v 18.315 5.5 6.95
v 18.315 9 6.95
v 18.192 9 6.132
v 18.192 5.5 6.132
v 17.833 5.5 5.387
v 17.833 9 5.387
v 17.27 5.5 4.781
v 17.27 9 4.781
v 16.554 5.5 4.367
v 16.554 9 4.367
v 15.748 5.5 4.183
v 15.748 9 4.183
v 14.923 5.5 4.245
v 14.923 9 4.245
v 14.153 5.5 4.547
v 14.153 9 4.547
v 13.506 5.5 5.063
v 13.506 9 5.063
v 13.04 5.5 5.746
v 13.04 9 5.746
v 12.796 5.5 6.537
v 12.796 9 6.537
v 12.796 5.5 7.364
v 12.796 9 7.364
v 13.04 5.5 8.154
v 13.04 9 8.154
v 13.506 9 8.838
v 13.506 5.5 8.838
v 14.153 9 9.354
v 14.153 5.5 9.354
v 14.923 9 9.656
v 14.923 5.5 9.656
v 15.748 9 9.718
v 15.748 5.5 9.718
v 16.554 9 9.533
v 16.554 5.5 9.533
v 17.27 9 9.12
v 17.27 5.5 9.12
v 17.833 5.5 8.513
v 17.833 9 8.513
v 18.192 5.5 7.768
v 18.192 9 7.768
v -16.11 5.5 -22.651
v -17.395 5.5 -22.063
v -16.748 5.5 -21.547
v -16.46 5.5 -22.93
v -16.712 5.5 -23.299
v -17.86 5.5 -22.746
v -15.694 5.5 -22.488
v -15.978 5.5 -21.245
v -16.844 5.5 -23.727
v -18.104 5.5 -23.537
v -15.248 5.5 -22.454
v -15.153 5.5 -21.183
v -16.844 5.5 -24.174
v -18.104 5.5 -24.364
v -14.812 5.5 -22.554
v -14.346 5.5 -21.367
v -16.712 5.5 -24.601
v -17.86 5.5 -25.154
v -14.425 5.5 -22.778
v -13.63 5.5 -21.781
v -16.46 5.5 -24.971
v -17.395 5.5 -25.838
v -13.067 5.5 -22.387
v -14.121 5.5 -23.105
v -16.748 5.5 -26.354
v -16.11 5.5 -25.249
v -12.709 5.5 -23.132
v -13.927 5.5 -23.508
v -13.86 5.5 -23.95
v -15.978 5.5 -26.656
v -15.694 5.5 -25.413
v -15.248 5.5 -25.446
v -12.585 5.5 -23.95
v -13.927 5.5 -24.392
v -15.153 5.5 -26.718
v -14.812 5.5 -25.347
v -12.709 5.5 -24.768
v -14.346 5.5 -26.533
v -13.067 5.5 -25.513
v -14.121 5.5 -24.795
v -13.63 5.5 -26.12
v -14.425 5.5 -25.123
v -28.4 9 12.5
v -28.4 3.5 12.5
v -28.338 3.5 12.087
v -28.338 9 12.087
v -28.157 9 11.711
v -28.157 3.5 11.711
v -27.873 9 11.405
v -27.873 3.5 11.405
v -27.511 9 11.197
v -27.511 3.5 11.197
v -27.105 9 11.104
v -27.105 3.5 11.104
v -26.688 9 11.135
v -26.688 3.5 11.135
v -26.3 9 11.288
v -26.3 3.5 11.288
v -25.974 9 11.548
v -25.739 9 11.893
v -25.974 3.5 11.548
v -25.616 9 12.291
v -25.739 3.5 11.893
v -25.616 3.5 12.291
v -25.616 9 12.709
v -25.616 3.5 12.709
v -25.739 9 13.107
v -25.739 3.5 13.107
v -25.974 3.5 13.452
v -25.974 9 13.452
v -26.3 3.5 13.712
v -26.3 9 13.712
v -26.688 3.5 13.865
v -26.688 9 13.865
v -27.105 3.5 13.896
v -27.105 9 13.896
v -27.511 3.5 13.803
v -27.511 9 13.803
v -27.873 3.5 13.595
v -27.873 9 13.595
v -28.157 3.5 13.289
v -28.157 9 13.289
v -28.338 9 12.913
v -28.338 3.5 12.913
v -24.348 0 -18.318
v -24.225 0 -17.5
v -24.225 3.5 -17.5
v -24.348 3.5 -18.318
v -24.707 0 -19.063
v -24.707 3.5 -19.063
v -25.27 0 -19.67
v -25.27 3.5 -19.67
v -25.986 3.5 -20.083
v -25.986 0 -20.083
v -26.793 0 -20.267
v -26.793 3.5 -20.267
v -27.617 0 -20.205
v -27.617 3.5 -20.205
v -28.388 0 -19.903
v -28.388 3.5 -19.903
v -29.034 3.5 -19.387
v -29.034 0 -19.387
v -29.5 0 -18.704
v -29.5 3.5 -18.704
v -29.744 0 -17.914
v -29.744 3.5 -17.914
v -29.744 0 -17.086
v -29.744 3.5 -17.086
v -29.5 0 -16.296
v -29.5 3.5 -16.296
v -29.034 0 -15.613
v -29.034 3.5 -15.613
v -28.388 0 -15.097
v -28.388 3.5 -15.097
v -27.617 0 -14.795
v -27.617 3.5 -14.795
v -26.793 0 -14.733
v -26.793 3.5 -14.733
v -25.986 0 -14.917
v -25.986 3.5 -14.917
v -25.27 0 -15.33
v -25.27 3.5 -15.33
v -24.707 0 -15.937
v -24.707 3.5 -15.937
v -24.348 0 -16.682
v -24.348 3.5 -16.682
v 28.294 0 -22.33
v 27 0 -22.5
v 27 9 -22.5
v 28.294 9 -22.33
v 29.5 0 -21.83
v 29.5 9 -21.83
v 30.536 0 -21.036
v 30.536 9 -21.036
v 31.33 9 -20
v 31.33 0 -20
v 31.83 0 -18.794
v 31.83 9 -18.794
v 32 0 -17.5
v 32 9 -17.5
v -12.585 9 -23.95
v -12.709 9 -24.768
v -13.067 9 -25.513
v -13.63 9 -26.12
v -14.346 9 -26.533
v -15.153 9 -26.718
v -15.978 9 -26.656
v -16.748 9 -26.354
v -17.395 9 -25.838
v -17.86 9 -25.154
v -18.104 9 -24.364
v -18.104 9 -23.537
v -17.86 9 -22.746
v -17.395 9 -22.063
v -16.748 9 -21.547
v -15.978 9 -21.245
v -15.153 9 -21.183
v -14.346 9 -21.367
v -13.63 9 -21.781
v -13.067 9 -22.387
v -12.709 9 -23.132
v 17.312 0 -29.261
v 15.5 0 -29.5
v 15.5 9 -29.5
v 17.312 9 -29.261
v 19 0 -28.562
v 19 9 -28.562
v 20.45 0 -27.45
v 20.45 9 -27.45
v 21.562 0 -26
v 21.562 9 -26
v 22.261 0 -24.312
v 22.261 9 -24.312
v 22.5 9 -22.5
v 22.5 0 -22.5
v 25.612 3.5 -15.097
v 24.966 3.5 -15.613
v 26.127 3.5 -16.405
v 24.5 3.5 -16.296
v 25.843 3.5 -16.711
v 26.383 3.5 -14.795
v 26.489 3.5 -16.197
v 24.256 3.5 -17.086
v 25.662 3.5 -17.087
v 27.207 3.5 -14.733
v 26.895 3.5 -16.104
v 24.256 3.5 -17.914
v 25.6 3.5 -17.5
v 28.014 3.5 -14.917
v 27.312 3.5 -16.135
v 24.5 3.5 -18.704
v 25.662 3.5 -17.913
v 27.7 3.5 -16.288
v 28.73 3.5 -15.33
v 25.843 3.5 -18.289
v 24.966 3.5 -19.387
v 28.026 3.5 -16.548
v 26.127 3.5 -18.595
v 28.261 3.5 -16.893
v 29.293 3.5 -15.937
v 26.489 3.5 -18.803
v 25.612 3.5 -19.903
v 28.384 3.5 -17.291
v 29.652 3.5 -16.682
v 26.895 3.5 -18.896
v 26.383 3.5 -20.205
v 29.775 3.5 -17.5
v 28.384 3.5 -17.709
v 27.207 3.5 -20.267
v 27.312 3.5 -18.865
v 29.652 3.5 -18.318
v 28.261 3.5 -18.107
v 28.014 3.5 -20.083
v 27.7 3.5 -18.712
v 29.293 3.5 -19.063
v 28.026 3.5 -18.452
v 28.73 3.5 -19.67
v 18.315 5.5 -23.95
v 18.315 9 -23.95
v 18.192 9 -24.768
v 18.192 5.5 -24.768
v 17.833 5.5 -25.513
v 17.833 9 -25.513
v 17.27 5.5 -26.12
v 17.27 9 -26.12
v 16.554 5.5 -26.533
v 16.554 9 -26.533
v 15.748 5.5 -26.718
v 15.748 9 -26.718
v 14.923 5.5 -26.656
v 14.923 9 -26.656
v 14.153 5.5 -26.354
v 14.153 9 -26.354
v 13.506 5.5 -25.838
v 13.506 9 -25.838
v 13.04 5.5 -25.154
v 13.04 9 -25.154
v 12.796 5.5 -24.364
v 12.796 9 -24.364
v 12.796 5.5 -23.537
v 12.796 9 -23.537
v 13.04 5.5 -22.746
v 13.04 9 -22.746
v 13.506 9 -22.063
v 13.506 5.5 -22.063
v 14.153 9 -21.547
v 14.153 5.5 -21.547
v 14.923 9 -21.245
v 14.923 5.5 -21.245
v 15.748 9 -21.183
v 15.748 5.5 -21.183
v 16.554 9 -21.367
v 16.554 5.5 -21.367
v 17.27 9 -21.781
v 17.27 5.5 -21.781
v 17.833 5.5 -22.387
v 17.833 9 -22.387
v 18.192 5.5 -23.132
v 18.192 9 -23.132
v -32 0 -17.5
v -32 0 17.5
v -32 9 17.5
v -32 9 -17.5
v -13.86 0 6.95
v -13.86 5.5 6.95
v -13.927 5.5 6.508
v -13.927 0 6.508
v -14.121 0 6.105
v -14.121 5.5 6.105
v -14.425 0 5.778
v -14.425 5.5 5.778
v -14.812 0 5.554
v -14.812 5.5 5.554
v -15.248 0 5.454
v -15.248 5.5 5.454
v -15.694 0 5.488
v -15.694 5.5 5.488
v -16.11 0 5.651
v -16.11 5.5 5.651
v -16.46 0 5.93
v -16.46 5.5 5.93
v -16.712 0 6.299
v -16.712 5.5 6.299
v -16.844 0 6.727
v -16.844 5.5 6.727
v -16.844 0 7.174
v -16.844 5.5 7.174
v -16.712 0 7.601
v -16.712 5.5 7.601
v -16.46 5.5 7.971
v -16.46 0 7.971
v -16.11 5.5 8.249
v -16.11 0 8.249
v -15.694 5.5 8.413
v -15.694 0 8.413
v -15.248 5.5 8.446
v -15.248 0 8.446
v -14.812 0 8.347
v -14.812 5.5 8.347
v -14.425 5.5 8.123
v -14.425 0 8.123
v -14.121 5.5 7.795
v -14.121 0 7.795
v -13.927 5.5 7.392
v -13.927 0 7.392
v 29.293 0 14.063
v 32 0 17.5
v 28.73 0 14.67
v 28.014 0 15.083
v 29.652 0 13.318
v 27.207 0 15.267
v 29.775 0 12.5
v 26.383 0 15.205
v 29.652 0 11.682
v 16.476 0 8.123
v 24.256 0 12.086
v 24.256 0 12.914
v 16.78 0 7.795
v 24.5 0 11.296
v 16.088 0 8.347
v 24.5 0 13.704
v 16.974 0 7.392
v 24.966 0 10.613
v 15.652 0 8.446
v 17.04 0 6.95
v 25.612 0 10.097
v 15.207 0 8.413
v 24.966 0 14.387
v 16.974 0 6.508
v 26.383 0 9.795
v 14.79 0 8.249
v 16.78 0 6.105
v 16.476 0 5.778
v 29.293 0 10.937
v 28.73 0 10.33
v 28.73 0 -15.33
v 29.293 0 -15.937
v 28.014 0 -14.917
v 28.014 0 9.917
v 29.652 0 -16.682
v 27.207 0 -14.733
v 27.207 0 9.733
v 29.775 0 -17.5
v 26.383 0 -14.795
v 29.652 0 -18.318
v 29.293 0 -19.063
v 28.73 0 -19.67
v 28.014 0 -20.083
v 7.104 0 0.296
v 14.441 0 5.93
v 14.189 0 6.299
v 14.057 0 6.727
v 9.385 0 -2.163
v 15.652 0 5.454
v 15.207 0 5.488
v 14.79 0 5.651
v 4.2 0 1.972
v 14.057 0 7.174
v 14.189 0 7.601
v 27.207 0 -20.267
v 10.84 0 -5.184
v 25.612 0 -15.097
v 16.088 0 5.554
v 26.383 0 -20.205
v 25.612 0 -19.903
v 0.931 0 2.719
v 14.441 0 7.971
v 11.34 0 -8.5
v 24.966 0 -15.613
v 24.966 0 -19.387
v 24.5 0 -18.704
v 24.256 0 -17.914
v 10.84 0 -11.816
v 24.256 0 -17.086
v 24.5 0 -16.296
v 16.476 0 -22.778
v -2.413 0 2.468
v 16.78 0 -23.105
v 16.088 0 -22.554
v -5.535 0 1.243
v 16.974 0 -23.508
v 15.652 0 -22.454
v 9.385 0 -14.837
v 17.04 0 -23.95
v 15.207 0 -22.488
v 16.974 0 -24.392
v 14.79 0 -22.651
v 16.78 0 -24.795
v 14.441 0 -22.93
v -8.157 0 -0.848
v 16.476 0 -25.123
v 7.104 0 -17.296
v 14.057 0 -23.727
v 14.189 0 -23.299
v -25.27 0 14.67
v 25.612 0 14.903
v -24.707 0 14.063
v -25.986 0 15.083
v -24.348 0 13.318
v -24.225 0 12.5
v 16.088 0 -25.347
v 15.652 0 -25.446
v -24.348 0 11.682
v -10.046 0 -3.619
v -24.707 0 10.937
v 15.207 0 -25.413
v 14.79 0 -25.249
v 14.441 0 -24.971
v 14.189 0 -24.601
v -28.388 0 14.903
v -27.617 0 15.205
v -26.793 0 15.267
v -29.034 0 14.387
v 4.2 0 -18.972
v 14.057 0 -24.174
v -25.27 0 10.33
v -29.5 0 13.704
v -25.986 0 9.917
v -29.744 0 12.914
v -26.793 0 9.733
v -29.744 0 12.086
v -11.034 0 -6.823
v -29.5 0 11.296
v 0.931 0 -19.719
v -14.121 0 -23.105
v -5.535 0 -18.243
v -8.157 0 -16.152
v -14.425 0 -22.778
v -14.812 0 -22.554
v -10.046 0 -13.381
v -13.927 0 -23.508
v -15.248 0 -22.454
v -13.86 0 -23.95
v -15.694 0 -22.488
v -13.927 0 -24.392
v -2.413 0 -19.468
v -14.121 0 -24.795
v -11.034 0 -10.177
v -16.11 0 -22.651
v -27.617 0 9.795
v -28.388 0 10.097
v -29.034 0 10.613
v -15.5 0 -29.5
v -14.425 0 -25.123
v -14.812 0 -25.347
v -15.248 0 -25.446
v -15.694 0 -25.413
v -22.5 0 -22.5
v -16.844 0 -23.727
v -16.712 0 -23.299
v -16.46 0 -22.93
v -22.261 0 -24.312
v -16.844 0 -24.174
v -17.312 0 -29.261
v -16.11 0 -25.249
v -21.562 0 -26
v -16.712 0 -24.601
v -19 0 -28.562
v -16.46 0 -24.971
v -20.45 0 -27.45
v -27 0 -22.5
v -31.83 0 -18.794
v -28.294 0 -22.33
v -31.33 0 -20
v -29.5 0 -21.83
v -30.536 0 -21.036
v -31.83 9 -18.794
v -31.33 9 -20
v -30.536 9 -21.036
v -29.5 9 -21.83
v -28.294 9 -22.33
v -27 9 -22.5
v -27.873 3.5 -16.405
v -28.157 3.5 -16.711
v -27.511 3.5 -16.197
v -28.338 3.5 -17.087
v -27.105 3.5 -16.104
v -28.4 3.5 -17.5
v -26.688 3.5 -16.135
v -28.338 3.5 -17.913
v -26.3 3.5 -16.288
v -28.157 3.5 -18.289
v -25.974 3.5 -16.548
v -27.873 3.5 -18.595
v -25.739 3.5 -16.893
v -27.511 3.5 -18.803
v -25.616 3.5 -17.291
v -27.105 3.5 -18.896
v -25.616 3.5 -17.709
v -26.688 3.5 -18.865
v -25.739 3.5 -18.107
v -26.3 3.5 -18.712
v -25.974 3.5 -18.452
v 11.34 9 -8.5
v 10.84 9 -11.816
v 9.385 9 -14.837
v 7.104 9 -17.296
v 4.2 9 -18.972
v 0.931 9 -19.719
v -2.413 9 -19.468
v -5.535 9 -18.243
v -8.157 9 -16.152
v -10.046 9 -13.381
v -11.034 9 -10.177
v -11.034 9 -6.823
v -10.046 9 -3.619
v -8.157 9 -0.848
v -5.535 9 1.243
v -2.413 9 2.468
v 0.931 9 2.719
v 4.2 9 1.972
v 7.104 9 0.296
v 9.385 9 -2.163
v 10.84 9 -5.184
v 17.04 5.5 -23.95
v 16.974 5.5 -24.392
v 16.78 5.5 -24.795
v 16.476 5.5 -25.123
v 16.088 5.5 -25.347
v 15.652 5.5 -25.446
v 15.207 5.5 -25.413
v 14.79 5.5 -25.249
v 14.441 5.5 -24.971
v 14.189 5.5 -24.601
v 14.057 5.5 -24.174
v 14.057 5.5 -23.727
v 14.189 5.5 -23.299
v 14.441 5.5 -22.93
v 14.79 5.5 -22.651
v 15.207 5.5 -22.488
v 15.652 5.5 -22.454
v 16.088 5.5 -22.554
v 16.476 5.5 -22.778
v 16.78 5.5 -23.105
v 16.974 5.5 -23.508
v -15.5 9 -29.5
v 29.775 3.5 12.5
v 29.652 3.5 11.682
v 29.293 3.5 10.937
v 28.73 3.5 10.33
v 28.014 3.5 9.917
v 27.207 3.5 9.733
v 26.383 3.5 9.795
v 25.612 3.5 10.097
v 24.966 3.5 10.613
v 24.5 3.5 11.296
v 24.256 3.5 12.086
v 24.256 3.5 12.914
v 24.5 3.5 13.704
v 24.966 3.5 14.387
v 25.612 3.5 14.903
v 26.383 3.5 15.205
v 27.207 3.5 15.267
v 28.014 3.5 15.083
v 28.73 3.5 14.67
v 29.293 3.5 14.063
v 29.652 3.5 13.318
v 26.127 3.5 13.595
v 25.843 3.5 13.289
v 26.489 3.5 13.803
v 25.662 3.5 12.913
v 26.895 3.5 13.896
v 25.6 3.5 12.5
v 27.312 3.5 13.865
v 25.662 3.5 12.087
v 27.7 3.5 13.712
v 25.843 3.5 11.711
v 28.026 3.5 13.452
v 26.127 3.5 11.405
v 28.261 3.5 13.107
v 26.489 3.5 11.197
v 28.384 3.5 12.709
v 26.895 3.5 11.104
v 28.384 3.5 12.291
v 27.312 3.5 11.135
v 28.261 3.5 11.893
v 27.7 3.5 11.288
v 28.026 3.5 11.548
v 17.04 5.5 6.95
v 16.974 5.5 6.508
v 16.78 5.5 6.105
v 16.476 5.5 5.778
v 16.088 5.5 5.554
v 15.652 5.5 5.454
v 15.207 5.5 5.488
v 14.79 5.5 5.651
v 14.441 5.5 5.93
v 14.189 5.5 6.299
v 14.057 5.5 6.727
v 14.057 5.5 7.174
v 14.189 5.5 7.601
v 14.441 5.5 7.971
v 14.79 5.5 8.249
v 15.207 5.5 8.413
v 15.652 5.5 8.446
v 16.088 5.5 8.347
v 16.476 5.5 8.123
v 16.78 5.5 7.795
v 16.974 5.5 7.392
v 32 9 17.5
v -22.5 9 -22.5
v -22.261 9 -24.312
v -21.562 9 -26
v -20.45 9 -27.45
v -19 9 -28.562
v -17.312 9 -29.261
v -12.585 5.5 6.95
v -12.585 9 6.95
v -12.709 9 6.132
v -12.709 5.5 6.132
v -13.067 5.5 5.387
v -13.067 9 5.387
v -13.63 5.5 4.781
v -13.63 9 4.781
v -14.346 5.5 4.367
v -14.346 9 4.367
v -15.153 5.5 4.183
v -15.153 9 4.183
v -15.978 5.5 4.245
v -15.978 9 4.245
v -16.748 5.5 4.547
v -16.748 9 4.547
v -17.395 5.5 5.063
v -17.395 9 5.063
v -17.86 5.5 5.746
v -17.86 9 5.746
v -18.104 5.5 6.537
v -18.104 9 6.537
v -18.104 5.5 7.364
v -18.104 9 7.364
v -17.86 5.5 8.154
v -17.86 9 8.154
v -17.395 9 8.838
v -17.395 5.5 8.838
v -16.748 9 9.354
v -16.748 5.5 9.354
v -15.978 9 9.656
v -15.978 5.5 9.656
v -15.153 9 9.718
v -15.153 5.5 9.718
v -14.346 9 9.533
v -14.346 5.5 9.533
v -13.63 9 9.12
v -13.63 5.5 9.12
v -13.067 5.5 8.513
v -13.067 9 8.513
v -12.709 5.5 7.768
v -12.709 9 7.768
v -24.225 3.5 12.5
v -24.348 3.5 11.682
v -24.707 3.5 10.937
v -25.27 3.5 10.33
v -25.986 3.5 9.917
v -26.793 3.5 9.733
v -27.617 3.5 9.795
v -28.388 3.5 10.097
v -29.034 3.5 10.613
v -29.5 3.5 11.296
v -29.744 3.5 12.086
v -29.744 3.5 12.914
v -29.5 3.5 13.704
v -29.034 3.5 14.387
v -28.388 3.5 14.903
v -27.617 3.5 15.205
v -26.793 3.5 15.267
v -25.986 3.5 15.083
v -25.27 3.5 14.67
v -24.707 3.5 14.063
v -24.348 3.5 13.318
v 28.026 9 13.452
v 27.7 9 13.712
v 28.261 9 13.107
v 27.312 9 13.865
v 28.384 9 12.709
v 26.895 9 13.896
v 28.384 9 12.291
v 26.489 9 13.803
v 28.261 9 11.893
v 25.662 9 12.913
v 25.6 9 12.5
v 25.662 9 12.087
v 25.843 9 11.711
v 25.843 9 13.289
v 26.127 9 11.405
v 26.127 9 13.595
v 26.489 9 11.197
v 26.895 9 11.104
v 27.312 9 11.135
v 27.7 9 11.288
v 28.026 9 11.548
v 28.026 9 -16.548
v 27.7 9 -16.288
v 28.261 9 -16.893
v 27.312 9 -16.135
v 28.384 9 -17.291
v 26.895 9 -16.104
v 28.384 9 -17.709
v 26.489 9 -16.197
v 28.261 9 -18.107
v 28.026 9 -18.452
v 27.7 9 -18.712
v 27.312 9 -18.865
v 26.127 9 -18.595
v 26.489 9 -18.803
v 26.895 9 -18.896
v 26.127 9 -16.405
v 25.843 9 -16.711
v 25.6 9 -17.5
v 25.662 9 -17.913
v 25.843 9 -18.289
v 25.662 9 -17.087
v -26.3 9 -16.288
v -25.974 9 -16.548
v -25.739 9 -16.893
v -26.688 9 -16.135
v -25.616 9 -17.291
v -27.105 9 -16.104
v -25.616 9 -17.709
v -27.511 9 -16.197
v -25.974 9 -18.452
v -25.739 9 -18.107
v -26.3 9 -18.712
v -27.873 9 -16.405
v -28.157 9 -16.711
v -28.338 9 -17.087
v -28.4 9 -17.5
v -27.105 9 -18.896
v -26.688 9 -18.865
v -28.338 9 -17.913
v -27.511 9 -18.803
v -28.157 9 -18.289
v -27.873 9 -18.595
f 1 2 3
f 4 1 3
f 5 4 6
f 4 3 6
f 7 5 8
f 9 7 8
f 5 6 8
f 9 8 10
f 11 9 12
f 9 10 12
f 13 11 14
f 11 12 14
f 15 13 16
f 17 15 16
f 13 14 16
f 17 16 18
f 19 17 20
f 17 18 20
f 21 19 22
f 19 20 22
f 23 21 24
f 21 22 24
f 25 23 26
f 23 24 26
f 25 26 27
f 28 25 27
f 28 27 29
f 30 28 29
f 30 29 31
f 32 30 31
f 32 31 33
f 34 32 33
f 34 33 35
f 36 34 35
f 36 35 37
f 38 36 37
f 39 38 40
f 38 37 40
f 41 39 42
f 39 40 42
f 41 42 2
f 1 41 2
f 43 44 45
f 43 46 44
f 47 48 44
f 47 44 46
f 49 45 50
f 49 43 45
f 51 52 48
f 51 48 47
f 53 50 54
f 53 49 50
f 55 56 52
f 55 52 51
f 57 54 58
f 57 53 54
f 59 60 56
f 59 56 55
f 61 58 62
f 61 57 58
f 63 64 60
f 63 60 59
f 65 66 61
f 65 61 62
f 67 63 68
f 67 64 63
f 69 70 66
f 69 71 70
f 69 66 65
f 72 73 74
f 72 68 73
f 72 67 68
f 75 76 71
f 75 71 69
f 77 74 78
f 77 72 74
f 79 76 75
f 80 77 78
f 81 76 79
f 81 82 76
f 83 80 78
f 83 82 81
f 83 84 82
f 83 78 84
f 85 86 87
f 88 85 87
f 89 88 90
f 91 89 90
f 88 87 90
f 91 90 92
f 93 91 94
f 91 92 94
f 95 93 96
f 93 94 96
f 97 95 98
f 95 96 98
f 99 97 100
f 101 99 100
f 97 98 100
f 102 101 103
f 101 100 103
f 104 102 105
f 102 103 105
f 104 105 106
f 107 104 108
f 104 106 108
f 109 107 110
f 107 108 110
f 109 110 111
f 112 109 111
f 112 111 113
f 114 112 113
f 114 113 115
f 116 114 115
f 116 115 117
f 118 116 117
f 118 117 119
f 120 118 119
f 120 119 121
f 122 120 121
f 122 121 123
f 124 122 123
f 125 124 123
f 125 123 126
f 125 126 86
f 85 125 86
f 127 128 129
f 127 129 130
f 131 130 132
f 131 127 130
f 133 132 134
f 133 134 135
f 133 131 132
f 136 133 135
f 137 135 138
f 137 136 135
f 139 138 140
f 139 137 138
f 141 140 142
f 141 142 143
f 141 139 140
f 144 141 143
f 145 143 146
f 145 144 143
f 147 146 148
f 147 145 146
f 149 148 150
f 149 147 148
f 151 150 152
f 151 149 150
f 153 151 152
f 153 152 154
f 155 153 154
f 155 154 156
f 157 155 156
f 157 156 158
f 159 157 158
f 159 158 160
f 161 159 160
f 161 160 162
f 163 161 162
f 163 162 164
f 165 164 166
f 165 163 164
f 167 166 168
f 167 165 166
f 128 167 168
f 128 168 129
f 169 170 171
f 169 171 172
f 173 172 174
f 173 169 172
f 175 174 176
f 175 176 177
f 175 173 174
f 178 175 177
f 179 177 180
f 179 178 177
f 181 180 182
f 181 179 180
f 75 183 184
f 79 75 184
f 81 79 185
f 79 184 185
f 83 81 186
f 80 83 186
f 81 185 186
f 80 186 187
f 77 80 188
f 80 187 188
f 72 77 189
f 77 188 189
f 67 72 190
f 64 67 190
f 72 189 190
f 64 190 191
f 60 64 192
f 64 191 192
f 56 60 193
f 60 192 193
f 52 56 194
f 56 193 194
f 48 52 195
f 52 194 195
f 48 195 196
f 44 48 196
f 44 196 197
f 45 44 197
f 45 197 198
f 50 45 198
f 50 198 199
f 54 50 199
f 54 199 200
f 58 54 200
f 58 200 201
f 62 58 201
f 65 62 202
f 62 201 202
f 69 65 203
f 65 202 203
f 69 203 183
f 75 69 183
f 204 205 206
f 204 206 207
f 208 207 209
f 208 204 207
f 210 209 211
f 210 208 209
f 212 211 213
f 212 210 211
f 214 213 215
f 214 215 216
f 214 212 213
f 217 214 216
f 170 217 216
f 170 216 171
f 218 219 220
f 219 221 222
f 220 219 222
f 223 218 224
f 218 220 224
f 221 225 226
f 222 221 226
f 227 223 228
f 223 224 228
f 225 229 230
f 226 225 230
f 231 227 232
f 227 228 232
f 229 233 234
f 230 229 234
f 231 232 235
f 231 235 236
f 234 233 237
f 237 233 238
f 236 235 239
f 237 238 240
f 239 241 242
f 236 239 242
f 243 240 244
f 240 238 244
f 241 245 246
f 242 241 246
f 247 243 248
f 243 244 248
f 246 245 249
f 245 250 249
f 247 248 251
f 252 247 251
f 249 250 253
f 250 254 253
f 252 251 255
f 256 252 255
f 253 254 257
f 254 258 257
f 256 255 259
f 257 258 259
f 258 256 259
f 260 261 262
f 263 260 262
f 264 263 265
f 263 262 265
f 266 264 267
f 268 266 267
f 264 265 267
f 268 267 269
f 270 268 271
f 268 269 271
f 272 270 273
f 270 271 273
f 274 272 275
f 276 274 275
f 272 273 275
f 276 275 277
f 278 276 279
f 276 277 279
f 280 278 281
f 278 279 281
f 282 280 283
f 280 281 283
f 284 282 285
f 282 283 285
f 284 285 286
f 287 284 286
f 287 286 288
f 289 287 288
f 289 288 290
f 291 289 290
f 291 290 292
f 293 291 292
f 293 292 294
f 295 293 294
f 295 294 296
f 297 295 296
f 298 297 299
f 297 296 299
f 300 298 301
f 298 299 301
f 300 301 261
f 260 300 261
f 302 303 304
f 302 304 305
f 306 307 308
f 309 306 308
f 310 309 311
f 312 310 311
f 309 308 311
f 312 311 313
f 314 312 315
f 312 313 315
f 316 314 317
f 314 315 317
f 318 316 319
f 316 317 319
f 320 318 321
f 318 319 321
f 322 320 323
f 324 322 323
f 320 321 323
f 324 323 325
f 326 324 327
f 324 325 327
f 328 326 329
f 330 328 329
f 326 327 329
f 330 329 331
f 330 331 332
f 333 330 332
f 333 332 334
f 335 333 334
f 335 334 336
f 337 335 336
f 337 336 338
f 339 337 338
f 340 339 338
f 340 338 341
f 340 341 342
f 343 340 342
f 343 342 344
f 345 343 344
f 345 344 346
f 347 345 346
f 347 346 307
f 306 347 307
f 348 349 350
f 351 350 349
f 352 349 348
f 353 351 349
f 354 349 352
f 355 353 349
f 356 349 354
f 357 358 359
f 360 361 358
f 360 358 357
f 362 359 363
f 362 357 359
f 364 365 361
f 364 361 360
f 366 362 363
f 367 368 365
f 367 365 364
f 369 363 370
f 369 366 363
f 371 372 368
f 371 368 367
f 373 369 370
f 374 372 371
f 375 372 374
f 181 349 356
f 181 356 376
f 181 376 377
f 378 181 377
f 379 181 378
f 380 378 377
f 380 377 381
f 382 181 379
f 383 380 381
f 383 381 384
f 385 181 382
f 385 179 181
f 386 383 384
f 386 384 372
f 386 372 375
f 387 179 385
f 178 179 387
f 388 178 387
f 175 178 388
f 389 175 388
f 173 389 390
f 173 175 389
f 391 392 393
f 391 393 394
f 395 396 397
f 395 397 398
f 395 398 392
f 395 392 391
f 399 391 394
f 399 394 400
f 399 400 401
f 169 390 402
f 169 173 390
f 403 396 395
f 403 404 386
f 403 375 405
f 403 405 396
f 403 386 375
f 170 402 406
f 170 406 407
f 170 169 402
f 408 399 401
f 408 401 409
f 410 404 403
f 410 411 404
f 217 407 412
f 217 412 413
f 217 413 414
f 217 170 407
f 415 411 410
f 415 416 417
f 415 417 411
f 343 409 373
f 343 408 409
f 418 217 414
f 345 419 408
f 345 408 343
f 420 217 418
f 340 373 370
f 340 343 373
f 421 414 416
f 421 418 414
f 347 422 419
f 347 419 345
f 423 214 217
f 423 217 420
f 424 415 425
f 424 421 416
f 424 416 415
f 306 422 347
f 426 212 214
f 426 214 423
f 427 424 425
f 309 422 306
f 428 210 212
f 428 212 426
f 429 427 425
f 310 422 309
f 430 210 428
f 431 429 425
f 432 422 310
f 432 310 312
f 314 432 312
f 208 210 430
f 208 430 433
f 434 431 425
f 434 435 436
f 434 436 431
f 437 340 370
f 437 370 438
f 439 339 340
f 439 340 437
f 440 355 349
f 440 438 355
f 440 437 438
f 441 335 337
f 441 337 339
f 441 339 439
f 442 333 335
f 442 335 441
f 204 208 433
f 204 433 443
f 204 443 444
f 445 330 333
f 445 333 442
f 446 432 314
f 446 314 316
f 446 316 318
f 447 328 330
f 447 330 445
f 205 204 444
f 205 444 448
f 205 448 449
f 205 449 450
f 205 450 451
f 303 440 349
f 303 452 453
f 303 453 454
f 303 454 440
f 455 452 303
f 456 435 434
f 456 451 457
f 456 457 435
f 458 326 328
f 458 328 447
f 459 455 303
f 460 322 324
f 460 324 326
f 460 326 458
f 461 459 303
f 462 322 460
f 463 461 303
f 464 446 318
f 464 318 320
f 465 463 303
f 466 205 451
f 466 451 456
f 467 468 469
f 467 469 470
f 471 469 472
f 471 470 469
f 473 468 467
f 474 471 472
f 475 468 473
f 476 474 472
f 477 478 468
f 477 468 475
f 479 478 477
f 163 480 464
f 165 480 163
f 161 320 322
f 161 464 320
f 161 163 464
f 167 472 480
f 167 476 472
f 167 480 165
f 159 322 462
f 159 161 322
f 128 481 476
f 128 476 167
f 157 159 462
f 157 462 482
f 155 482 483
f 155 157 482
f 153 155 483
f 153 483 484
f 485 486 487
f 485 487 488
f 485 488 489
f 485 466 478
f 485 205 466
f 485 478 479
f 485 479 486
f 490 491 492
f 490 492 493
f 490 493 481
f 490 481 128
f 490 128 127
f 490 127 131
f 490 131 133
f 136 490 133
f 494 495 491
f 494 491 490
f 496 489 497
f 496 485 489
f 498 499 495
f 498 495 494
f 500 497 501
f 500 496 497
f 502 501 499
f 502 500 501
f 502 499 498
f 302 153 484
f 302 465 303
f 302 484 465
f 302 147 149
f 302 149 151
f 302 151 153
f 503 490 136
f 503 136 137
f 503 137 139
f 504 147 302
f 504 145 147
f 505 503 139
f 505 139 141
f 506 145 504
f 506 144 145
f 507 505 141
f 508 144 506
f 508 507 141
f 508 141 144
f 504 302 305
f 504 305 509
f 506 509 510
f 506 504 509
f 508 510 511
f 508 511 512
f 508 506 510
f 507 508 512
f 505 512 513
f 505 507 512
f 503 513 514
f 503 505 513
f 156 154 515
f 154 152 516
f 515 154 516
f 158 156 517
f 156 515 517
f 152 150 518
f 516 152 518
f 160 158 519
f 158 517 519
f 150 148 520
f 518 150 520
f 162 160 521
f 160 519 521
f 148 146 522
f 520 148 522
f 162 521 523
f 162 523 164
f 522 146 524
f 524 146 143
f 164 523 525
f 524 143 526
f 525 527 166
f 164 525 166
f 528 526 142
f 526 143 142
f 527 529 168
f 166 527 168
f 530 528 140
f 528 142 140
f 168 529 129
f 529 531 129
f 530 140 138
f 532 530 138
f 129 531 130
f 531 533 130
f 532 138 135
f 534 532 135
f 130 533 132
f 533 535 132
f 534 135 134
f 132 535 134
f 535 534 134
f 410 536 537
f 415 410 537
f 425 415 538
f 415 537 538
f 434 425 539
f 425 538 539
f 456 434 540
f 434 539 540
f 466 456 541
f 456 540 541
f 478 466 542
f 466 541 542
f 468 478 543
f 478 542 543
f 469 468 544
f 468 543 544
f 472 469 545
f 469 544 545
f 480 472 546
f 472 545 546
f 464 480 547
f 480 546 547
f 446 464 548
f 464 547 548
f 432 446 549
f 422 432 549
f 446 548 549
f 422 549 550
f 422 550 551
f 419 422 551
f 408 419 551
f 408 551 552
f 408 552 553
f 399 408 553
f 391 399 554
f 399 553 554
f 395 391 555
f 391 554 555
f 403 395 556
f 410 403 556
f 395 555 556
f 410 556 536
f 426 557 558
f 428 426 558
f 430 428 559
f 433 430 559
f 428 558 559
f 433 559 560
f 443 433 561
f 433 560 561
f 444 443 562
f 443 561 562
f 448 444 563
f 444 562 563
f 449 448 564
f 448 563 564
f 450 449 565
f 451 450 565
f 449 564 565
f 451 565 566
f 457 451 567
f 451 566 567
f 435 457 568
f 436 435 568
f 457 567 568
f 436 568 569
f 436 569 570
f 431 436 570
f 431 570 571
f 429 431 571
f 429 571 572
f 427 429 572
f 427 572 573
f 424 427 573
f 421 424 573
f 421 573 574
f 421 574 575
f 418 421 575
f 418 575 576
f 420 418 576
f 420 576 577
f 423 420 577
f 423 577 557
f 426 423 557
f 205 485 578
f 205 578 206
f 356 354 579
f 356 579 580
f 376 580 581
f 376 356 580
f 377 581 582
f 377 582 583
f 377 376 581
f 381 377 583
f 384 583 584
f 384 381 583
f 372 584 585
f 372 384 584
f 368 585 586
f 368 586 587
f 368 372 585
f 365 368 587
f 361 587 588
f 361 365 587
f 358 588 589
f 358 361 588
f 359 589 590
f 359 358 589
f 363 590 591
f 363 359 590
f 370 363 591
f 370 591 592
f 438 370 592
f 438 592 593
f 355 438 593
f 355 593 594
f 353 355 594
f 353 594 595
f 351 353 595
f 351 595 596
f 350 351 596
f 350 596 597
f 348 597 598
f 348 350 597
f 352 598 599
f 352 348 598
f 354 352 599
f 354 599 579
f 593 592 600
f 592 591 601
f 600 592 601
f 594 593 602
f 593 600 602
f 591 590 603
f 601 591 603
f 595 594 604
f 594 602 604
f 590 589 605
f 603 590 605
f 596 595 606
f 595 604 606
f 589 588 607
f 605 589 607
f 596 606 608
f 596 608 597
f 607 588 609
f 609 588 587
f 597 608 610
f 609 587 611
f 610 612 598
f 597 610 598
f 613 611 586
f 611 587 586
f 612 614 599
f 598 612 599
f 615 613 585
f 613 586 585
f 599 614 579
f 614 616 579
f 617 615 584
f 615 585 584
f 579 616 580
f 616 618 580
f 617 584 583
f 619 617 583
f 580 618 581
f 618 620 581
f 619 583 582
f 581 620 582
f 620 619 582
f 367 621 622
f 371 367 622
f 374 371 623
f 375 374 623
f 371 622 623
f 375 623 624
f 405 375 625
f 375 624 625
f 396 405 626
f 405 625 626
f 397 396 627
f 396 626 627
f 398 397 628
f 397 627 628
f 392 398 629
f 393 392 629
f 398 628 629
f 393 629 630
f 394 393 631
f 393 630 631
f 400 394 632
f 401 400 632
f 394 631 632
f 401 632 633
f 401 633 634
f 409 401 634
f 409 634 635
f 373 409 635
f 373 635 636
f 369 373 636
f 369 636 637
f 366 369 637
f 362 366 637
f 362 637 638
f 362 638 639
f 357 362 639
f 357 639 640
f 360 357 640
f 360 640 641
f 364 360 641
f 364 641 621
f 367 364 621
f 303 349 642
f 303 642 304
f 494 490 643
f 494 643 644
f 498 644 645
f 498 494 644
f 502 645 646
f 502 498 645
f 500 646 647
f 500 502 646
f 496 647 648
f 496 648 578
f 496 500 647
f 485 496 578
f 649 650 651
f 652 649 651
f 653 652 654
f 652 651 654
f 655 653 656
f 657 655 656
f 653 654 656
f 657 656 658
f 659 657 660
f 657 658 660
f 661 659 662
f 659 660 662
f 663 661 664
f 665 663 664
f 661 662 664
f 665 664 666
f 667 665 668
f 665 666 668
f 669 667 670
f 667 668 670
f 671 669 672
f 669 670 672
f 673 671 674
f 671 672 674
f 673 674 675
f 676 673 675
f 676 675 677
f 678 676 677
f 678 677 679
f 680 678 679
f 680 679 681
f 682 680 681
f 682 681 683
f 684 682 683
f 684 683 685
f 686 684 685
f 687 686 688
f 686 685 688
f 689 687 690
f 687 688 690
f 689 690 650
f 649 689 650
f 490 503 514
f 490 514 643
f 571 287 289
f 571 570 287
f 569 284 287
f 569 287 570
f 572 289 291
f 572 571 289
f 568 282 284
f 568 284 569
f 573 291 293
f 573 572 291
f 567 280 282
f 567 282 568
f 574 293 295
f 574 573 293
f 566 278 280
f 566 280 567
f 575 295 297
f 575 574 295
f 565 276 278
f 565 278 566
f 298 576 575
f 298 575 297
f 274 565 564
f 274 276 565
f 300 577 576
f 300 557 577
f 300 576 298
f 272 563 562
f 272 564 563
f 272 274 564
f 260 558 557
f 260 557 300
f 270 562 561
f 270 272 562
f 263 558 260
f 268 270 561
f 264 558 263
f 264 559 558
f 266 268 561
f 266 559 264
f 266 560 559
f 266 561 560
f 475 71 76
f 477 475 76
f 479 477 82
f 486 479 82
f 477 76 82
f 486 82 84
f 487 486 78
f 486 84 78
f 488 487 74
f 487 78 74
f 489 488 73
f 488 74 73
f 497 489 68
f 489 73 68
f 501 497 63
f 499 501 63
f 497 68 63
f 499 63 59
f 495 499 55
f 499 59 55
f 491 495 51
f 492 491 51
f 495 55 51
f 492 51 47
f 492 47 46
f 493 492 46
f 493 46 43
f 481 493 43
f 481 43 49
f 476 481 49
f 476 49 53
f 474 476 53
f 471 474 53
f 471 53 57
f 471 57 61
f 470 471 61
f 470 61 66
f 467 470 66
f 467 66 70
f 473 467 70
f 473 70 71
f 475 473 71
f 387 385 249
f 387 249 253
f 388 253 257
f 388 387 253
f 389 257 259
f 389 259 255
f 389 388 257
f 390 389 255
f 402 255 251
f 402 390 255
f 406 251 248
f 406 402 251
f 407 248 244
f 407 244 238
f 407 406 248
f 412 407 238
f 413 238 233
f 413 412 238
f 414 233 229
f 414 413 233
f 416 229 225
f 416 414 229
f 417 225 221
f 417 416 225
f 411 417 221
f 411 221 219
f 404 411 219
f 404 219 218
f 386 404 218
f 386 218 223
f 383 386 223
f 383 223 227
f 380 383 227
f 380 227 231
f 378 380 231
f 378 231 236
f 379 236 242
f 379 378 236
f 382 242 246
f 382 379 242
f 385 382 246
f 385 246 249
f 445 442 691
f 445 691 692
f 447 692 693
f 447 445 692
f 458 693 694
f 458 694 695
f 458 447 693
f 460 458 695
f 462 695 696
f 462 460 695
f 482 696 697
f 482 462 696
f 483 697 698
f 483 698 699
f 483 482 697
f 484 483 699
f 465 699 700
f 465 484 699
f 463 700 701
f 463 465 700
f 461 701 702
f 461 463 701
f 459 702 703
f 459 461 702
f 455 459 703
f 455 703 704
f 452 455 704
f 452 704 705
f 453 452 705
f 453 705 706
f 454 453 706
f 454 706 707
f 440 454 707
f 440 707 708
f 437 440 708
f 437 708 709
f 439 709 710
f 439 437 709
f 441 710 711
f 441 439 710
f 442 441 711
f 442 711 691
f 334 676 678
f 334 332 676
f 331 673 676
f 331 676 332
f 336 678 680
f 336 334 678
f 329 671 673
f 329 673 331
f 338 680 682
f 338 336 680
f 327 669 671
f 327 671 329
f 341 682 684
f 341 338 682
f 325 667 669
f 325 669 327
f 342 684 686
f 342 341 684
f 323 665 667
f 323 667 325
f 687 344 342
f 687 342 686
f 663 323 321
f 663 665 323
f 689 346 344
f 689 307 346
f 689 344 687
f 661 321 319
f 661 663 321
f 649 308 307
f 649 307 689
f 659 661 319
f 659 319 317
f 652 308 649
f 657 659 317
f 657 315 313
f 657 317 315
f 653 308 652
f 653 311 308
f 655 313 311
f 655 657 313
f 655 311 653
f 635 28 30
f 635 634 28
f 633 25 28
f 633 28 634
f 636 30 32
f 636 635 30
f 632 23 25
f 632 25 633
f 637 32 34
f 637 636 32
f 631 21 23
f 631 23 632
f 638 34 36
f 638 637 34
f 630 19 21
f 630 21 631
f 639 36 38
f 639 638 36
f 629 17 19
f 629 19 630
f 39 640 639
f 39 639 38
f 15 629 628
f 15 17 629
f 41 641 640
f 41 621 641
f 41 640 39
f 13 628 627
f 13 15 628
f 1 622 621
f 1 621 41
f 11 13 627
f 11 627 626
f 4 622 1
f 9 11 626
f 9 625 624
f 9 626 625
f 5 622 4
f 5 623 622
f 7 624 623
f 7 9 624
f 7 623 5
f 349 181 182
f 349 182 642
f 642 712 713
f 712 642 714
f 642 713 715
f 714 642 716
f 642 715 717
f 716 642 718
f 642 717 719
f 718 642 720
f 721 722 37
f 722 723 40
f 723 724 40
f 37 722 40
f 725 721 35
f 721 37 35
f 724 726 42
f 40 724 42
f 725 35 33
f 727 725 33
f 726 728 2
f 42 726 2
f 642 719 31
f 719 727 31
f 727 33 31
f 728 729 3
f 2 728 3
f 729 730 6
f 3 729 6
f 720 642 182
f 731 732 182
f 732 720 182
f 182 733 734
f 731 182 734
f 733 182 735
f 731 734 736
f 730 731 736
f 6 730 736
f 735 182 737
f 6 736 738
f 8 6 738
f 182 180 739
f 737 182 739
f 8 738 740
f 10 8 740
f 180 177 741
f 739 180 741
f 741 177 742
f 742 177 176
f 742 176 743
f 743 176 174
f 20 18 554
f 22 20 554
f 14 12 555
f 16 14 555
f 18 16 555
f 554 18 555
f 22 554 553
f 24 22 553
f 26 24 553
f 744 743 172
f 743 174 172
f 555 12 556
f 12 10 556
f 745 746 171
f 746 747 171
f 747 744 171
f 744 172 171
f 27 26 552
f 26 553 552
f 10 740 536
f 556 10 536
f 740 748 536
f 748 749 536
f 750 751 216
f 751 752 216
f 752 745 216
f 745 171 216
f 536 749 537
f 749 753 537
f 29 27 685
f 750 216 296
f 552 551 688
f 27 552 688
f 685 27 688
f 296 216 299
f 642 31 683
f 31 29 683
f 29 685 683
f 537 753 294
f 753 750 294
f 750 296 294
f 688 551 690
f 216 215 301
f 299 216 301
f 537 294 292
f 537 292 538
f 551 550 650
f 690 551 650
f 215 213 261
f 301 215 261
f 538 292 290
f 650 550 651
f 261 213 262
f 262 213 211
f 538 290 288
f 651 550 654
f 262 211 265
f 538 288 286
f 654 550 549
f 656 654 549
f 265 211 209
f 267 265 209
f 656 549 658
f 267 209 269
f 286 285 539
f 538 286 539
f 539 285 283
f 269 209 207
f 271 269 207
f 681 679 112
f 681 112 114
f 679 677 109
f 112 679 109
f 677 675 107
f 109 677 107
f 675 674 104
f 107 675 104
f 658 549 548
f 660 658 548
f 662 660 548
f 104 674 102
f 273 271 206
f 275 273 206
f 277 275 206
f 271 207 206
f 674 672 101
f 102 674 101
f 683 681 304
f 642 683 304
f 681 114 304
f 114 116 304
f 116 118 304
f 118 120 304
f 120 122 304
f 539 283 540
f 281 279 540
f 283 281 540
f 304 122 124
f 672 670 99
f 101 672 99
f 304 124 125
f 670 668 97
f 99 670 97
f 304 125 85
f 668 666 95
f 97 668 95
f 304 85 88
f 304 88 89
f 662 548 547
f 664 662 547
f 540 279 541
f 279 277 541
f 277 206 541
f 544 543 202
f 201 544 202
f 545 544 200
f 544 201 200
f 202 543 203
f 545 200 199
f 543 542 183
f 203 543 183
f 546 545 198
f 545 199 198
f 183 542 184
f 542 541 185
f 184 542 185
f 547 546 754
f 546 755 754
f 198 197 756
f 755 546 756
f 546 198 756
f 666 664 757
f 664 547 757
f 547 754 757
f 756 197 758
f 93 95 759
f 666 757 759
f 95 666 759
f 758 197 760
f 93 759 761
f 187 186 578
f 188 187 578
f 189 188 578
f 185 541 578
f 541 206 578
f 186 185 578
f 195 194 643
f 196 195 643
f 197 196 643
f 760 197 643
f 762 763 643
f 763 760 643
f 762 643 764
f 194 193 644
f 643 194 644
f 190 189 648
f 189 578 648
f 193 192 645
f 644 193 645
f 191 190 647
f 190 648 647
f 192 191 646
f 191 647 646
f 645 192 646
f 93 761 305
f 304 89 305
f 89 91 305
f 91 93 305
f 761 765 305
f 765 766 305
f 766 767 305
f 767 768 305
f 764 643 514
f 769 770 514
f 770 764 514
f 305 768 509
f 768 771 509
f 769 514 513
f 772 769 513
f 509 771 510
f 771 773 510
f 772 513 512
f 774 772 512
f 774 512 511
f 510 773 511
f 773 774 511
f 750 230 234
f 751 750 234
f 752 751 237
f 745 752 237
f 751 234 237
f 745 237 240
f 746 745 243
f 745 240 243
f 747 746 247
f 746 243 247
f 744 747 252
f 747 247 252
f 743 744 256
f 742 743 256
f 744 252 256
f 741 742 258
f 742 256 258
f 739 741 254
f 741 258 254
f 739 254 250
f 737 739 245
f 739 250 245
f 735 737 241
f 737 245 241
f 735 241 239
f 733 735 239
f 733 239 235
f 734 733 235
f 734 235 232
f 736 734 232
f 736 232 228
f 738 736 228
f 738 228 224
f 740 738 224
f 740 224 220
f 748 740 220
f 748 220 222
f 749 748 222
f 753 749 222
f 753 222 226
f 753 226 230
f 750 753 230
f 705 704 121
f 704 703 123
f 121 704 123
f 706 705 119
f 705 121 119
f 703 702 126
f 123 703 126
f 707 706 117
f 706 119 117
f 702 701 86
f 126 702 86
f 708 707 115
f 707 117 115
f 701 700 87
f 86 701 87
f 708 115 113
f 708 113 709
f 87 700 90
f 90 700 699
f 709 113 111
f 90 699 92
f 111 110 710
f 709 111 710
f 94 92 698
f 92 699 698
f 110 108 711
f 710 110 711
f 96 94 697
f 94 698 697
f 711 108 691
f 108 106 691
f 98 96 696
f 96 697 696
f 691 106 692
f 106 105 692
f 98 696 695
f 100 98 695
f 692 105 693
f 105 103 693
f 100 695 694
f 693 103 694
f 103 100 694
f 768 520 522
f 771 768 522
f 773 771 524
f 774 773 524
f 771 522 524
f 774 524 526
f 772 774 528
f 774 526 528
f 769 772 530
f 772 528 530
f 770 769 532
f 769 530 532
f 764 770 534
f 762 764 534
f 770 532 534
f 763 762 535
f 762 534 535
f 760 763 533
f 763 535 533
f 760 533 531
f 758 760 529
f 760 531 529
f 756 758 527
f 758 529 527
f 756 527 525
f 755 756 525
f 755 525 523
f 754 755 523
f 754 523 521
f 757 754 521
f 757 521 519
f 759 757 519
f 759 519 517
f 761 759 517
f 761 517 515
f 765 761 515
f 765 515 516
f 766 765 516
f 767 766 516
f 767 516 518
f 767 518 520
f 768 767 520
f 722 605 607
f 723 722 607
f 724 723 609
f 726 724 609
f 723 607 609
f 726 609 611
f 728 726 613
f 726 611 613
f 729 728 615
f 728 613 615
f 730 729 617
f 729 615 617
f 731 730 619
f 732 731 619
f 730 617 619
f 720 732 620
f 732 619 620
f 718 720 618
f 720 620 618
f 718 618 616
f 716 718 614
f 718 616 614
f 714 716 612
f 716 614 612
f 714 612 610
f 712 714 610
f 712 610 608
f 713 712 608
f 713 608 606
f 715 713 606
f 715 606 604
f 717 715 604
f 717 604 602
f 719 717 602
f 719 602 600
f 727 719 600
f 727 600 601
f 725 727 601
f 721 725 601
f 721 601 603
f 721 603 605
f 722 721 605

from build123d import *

# Parameters (mm, degrees)
BOSS_EXTRUDE1_DEPTH = 9
SKETCH2_R           = 11.25
CUT_EXTRUDE1_DEPTH  = 9
SKETCH3_R           = 2.775
CUT_EXTRUDE2_DEPTH  = 3.5
SKETCH5_R           = 2.775
CUT_EXTRUDE4_DEPTH  = 3.5
SKETCH4_R           = 1.5
CUT_EXTRUDE3_DEPTH  = 6
SKETCH6_R           = 1.4
CUT_EXTRUDE5_DEPTH  = 6


with BuildPart() as part:
    # Sketch1 → Boss-Extrude1 (new body)
    with BuildSketch(Plane(origin=(0, 0, 0), x_dir=(1, 0, 0), z_dir=(0, 1, 0))):
        with BuildLine():
            Line((-15.5, 29.5), (15.5, 29.5))
            ThreePointArc((15.5, 29.5), (20.449747468, 27.449747468), (22.5, 22.5))
            Line((22.5, 22.5), (27, 22.5))
            ThreePointArc((27, 22.5), (30.535533906, 21.035533906), (32, 17.5))
            Line((32, 17.5), (32, -17.5))
            Line((32, -17.5), (-32, -17.5))
            Line((-32, -17.5), (-32, 17.5))
            ThreePointArc((-32, 17.5), (-30.535533906, 21.035533906), (-27, 22.5))
            Line((-27, 22.5), (-22.5, 22.5))
            ThreePointArc((-22.5, 22.5), (-20.449747468, 27.449747468), (-15.5, 29.5))
        make_face()
    extrude(amount=BOSS_EXTRUDE1_DEPTH)

    # Sketch2 → Cut-Extrude1 (cut)
    with BuildSketch(Plane(origin=(0, 9, 0), x_dir=(1, 0, 0), z_dir=(0, 1, 0))):
        with Locations((0.09, 8.5)):
            Circle(SKETCH2_R)
    extrude(amount=-CUT_EXTRUDE1_DEPTH, mode=Mode.SUBTRACT)

    # Sketch3 → Cut-Extrude2 (cut)
    with BuildSketch(Plane(origin=(0, 9, 0), x_dir=(1, 0, 0), z_dir=(0, 1, 0))):
        with Locations((-15.360283169, 23.950283169)):
            Circle(SKETCH3_R)
        with Locations((15.540283169, 23.950283169)):
            Circle(SKETCH3_R)
        with Locations((15.540283169, -6.950283169)):
            Circle(SKETCH3_R)
        with Locations((-15.360283169, -6.950283169)):
            Circle(SKETCH3_R)
    extrude(amount=-CUT_EXTRUDE2_DEPTH, mode=Mode.SUBTRACT)

    # Sketch5 → Cut-Extrude4 (cut)
    with BuildSketch(Plane(origin=(0, 0, 0), x_dir=(1, 0, 0), z_dir=(0, 1, 0))):
        with Locations((-27, 17.5)):
            Circle(SKETCH5_R)
        with Locations((27, 17.5)):
            Circle(SKETCH5_R)
        with Locations((27, -12.5)):
            Circle(SKETCH5_R)
        with Locations((-27, -12.5)):
            Circle(SKETCH5_R)
    extrude(amount=CUT_EXTRUDE4_DEPTH, mode=Mode.SUBTRACT)

    # Sketch4 → Cut-Extrude3 (cut)
    with BuildSketch(Plane(origin=(0, 5.5, 0), x_dir=(1, 0, 0), z_dir=(0, 1, 0))):
        with Locations((-15.360283169, 23.950283169)):
            Circle(SKETCH4_R)
        with Locations((15.540283169, 23.950283169)):
            Circle(SKETCH4_R)
        with Locations((15.540283169, -6.950283169)):
            Circle(SKETCH4_R)
        with Locations((-15.360283169, -6.950283169)):
            Circle(SKETCH4_R)
    extrude(amount=-CUT_EXTRUDE3_DEPTH, mode=Mode.SUBTRACT)

    # Sketch6 → Cut-Extrude5 (cut)
    with BuildSketch(Plane(origin=(0, 3.5, 0), x_dir=(-1, 0, 0), z_dir=(0, -1, 0))):
        with Locations((-27, -12.5)):
            Circle(SKETCH6_R)
        with Locations((-27, 17.5)):
            Circle(SKETCH6_R)
        with Locations((27, 17.5)):
            Circle(SKETCH6_R)
        with Locations((27, -12.5)):
            Circle(SKETCH6_R)
    extrude(amount=-CUT_EXTRUDE5_DEPTH, mode=Mode.SUBTRACT)


solid = part.part
